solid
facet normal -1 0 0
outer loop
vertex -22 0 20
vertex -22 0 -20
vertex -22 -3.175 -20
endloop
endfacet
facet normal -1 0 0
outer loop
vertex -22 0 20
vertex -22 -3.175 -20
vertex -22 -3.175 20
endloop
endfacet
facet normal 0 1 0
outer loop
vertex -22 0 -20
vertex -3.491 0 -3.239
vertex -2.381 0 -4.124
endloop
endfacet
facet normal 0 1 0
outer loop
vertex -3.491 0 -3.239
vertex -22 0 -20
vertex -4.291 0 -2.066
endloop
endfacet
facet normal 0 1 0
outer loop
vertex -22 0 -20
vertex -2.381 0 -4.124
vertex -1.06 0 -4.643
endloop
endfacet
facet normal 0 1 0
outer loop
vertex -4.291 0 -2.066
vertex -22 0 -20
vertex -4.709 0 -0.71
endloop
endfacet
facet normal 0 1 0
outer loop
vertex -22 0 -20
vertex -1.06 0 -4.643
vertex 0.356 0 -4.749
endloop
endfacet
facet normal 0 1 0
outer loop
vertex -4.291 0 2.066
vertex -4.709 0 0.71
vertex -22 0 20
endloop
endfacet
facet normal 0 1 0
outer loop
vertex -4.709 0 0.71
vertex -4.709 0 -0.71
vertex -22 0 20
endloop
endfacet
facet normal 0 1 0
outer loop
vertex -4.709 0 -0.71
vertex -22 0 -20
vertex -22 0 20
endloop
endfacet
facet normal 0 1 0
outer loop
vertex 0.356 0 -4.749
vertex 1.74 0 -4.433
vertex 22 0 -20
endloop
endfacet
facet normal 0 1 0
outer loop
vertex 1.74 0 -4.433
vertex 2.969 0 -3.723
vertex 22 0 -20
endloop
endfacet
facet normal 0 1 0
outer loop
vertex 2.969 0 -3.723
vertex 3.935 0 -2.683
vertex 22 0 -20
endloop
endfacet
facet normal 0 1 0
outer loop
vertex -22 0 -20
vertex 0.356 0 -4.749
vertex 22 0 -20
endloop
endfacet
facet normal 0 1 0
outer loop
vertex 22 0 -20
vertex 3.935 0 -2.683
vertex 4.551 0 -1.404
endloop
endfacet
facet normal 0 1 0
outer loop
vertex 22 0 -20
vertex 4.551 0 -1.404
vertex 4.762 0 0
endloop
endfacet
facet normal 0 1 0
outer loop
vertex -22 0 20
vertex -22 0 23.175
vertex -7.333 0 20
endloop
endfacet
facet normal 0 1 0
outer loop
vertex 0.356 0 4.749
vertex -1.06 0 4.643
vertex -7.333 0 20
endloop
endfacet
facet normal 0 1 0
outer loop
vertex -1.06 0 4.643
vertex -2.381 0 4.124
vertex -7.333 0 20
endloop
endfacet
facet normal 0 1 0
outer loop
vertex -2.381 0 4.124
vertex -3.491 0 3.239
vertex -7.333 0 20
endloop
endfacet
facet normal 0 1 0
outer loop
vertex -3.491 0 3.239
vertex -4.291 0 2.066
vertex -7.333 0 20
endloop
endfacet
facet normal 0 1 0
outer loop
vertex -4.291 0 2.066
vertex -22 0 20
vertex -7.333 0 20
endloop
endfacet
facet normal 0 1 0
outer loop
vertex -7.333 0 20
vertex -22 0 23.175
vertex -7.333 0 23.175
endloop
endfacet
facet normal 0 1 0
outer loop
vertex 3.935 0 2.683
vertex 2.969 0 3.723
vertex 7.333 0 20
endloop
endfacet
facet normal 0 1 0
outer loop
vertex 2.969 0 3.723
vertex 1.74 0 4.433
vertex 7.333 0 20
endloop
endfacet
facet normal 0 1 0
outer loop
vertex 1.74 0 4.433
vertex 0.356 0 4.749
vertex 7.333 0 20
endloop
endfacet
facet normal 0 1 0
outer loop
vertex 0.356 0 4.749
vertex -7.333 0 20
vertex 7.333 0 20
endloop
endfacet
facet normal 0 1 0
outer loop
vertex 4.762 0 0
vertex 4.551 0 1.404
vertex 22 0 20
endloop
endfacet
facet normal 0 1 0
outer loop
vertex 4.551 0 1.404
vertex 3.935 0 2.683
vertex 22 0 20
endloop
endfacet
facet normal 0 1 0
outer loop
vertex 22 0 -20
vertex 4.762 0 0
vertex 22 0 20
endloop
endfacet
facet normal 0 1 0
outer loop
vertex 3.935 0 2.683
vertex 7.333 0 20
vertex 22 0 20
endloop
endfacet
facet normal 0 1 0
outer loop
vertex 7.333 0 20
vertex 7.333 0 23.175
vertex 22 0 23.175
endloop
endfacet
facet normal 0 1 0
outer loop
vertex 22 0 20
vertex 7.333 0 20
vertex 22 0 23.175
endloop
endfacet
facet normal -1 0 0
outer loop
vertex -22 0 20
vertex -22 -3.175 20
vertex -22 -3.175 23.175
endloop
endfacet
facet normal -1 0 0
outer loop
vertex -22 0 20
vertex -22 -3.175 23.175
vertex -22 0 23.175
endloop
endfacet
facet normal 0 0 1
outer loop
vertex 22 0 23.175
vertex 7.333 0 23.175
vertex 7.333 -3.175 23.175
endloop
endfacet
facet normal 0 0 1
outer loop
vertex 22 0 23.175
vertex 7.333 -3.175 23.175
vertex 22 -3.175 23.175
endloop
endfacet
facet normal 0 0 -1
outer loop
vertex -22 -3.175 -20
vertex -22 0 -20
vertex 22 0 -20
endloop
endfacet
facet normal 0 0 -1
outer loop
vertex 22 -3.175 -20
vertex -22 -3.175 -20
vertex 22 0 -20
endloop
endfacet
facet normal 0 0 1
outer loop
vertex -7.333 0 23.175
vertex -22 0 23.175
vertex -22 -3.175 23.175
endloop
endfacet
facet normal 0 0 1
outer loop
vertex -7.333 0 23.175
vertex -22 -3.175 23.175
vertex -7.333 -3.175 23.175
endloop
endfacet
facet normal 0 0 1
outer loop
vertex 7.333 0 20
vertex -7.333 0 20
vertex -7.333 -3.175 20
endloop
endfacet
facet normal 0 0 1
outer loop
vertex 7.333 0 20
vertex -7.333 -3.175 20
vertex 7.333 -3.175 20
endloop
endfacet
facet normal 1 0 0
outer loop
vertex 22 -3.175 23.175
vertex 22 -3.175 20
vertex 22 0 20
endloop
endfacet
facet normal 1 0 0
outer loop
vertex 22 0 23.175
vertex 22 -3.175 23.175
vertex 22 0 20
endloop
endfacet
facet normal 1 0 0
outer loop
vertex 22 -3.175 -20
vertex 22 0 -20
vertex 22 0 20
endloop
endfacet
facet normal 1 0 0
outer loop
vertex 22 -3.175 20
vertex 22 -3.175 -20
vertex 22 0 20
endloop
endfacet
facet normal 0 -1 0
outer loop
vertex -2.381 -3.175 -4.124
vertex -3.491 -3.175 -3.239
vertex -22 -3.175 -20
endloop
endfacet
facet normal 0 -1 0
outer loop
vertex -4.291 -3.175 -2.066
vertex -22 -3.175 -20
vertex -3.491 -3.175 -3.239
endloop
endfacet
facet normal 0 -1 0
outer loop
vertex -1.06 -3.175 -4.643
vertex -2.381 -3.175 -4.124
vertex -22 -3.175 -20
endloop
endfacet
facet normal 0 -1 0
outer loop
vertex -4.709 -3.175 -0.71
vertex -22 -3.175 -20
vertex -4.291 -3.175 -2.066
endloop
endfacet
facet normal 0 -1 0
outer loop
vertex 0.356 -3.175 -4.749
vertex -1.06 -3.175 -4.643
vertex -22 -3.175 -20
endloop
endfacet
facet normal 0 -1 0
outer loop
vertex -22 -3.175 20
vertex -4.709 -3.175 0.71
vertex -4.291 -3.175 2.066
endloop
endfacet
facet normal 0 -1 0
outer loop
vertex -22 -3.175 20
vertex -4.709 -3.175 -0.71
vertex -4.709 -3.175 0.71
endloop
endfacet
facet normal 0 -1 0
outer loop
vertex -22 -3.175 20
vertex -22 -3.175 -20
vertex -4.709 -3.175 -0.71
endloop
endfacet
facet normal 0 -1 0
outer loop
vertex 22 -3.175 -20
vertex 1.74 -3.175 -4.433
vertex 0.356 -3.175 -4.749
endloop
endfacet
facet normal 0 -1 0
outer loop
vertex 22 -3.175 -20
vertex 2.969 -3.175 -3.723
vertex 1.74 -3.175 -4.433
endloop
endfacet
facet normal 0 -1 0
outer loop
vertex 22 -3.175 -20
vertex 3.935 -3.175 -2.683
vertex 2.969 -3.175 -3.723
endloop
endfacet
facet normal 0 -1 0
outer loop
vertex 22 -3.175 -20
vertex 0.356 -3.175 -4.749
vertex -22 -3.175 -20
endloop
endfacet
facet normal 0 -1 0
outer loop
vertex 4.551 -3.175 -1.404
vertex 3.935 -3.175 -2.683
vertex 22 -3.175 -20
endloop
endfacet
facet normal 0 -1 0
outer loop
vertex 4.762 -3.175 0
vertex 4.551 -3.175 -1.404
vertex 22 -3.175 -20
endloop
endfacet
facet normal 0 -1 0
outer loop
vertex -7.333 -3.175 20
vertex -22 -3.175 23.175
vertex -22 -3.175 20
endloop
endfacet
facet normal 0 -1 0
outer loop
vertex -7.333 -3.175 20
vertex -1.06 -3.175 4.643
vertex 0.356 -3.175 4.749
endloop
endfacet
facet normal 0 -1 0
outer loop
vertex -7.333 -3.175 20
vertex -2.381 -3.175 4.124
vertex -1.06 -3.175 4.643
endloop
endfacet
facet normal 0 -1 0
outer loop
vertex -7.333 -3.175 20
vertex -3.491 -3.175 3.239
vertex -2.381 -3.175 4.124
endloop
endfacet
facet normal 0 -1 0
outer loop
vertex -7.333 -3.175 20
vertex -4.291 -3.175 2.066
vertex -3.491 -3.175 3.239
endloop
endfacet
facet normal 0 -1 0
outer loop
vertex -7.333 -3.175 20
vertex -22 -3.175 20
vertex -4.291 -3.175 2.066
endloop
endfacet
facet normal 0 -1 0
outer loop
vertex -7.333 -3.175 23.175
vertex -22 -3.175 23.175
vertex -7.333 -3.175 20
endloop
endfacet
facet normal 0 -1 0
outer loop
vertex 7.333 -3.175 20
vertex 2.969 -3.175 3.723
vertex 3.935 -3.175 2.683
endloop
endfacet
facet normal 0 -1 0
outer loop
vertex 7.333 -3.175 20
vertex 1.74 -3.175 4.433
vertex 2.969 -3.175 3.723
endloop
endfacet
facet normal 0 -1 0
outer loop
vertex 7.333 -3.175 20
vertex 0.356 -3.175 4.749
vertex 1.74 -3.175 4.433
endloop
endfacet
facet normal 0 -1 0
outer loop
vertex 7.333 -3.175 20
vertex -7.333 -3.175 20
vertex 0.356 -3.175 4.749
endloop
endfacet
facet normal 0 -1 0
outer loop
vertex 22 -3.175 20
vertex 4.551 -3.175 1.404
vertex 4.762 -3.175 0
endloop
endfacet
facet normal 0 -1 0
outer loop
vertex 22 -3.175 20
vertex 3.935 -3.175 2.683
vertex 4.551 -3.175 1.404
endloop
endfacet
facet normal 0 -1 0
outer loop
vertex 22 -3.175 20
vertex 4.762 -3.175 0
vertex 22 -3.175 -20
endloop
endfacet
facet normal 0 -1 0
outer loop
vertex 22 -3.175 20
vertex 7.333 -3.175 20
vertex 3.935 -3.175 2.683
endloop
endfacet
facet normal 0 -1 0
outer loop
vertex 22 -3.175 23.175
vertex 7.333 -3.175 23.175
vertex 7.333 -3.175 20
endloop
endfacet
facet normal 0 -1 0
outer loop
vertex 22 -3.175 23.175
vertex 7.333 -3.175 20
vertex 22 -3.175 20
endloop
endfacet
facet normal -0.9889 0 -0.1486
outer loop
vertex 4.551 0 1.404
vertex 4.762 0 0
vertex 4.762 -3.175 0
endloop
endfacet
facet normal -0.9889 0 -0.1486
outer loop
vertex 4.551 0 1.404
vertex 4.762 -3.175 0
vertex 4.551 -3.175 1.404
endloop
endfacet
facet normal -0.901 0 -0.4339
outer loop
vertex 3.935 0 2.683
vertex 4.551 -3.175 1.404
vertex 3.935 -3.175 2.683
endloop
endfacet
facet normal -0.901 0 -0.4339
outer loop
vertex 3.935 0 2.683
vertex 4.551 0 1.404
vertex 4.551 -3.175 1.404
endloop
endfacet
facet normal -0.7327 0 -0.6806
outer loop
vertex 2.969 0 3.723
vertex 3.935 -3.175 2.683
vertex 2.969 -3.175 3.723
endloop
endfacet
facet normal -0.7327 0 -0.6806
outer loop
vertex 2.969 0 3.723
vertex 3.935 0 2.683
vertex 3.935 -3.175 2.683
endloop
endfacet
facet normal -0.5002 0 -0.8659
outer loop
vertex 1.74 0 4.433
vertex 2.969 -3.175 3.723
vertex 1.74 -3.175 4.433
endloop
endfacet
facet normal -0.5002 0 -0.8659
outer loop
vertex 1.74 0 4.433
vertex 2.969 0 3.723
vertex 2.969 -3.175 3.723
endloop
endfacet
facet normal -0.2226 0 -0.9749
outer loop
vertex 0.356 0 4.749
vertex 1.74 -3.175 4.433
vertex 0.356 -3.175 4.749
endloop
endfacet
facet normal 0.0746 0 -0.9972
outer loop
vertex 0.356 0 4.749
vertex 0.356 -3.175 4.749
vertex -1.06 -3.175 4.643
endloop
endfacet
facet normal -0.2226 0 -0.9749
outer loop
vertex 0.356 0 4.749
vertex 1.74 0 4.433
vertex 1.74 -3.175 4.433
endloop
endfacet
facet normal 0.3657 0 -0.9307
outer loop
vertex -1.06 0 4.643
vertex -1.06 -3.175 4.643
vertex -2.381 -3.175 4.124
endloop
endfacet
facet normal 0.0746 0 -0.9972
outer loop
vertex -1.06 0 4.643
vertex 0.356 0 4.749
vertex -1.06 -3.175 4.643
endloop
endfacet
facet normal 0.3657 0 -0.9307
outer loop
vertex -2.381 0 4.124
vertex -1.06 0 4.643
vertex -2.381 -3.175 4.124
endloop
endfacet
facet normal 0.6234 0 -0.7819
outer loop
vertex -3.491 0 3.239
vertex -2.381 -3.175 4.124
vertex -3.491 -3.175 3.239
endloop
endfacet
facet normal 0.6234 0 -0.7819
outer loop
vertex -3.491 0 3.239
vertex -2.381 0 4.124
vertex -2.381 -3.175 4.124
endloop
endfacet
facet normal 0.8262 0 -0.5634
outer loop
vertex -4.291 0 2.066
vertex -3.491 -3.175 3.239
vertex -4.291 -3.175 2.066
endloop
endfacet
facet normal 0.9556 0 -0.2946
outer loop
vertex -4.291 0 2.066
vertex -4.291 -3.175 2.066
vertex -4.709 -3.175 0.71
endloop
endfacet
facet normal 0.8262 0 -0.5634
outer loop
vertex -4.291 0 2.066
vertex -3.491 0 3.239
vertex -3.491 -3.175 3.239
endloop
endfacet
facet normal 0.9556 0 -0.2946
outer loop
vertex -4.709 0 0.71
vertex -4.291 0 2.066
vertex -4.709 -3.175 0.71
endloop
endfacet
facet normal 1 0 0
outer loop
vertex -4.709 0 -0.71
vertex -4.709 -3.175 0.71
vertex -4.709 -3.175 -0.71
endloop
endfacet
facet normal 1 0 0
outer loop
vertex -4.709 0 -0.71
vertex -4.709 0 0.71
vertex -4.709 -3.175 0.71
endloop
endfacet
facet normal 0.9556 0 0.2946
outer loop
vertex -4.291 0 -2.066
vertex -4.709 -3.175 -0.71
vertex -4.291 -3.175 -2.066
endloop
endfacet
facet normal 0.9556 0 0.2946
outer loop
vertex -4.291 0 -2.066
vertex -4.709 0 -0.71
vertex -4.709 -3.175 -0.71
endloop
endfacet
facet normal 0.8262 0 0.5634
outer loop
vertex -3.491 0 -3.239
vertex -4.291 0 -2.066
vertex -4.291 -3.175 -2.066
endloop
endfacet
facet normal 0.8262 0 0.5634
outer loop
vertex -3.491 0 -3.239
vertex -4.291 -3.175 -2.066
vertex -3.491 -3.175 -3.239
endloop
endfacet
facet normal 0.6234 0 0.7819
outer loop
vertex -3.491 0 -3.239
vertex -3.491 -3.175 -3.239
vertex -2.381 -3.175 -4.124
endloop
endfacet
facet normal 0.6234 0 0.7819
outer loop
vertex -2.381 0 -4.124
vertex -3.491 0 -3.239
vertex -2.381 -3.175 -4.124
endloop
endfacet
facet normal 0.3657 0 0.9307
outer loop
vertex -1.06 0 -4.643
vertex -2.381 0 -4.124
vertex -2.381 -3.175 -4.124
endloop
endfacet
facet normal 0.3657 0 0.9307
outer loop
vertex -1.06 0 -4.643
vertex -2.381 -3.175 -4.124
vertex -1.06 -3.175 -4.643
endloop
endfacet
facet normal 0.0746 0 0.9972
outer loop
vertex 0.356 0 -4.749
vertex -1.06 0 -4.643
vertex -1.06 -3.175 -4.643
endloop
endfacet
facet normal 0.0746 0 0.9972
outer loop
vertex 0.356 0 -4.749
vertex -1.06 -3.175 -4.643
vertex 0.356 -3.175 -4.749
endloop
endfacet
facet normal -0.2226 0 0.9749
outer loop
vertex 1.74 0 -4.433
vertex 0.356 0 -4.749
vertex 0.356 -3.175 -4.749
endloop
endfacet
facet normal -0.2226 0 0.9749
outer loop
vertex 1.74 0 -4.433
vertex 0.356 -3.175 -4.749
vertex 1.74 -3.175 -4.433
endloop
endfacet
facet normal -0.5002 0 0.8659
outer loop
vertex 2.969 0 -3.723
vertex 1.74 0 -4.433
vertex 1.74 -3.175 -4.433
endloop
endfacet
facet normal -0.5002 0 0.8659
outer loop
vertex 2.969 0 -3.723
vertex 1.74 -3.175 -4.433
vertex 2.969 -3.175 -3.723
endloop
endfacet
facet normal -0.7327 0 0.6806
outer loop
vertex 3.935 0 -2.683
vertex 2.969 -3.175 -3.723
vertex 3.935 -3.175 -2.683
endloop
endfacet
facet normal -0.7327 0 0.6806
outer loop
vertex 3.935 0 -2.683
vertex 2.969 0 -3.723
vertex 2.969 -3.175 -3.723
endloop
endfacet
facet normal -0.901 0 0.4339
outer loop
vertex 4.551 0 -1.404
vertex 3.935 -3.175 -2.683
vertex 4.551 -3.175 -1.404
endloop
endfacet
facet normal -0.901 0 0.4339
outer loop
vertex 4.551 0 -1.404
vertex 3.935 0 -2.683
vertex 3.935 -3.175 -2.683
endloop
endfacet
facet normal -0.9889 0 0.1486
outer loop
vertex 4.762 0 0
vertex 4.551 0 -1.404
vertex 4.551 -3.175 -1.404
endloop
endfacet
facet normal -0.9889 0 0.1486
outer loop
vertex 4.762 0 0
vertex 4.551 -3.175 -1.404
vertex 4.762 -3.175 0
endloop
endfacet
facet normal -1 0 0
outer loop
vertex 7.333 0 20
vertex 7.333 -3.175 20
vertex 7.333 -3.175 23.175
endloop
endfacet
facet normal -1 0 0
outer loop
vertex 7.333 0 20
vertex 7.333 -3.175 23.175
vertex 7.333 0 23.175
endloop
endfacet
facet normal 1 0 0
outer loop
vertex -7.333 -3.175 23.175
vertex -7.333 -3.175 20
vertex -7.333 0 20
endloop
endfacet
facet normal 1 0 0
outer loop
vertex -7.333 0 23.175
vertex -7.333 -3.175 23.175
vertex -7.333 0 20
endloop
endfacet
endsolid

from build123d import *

# Parameters (mm, degrees)
F0_W     = 44
F0_H     = 40
F0_R     = 4.7625
F1_DEPTH = 3.175
F2_W     = 14.666667
F2_H     = 3.175
F3_DEPTH = 3.175


with BuildPart() as f1:
    # F0 (on Front) → F1 (new body)
    with BuildSketch(Plane.XZ):
        Rectangle(F0_W, F0_H)
        Circle(F0_R, mode=Mode.SUBTRACT)
    extrude(amount=F1_DEPTH)

    # F2 (on face) → F3 (join)
    with BuildSketch(Plane.XY.offset(20)):
        with Locations((-14.666666, -1.5875)):
            Rectangle(F2_W, F2_H)
        with Locations((14.666666, -1.5875)):
            Rectangle(F2_W, F2_H)
    extrude(amount=F3_DEPTH)


solid = f1.part
